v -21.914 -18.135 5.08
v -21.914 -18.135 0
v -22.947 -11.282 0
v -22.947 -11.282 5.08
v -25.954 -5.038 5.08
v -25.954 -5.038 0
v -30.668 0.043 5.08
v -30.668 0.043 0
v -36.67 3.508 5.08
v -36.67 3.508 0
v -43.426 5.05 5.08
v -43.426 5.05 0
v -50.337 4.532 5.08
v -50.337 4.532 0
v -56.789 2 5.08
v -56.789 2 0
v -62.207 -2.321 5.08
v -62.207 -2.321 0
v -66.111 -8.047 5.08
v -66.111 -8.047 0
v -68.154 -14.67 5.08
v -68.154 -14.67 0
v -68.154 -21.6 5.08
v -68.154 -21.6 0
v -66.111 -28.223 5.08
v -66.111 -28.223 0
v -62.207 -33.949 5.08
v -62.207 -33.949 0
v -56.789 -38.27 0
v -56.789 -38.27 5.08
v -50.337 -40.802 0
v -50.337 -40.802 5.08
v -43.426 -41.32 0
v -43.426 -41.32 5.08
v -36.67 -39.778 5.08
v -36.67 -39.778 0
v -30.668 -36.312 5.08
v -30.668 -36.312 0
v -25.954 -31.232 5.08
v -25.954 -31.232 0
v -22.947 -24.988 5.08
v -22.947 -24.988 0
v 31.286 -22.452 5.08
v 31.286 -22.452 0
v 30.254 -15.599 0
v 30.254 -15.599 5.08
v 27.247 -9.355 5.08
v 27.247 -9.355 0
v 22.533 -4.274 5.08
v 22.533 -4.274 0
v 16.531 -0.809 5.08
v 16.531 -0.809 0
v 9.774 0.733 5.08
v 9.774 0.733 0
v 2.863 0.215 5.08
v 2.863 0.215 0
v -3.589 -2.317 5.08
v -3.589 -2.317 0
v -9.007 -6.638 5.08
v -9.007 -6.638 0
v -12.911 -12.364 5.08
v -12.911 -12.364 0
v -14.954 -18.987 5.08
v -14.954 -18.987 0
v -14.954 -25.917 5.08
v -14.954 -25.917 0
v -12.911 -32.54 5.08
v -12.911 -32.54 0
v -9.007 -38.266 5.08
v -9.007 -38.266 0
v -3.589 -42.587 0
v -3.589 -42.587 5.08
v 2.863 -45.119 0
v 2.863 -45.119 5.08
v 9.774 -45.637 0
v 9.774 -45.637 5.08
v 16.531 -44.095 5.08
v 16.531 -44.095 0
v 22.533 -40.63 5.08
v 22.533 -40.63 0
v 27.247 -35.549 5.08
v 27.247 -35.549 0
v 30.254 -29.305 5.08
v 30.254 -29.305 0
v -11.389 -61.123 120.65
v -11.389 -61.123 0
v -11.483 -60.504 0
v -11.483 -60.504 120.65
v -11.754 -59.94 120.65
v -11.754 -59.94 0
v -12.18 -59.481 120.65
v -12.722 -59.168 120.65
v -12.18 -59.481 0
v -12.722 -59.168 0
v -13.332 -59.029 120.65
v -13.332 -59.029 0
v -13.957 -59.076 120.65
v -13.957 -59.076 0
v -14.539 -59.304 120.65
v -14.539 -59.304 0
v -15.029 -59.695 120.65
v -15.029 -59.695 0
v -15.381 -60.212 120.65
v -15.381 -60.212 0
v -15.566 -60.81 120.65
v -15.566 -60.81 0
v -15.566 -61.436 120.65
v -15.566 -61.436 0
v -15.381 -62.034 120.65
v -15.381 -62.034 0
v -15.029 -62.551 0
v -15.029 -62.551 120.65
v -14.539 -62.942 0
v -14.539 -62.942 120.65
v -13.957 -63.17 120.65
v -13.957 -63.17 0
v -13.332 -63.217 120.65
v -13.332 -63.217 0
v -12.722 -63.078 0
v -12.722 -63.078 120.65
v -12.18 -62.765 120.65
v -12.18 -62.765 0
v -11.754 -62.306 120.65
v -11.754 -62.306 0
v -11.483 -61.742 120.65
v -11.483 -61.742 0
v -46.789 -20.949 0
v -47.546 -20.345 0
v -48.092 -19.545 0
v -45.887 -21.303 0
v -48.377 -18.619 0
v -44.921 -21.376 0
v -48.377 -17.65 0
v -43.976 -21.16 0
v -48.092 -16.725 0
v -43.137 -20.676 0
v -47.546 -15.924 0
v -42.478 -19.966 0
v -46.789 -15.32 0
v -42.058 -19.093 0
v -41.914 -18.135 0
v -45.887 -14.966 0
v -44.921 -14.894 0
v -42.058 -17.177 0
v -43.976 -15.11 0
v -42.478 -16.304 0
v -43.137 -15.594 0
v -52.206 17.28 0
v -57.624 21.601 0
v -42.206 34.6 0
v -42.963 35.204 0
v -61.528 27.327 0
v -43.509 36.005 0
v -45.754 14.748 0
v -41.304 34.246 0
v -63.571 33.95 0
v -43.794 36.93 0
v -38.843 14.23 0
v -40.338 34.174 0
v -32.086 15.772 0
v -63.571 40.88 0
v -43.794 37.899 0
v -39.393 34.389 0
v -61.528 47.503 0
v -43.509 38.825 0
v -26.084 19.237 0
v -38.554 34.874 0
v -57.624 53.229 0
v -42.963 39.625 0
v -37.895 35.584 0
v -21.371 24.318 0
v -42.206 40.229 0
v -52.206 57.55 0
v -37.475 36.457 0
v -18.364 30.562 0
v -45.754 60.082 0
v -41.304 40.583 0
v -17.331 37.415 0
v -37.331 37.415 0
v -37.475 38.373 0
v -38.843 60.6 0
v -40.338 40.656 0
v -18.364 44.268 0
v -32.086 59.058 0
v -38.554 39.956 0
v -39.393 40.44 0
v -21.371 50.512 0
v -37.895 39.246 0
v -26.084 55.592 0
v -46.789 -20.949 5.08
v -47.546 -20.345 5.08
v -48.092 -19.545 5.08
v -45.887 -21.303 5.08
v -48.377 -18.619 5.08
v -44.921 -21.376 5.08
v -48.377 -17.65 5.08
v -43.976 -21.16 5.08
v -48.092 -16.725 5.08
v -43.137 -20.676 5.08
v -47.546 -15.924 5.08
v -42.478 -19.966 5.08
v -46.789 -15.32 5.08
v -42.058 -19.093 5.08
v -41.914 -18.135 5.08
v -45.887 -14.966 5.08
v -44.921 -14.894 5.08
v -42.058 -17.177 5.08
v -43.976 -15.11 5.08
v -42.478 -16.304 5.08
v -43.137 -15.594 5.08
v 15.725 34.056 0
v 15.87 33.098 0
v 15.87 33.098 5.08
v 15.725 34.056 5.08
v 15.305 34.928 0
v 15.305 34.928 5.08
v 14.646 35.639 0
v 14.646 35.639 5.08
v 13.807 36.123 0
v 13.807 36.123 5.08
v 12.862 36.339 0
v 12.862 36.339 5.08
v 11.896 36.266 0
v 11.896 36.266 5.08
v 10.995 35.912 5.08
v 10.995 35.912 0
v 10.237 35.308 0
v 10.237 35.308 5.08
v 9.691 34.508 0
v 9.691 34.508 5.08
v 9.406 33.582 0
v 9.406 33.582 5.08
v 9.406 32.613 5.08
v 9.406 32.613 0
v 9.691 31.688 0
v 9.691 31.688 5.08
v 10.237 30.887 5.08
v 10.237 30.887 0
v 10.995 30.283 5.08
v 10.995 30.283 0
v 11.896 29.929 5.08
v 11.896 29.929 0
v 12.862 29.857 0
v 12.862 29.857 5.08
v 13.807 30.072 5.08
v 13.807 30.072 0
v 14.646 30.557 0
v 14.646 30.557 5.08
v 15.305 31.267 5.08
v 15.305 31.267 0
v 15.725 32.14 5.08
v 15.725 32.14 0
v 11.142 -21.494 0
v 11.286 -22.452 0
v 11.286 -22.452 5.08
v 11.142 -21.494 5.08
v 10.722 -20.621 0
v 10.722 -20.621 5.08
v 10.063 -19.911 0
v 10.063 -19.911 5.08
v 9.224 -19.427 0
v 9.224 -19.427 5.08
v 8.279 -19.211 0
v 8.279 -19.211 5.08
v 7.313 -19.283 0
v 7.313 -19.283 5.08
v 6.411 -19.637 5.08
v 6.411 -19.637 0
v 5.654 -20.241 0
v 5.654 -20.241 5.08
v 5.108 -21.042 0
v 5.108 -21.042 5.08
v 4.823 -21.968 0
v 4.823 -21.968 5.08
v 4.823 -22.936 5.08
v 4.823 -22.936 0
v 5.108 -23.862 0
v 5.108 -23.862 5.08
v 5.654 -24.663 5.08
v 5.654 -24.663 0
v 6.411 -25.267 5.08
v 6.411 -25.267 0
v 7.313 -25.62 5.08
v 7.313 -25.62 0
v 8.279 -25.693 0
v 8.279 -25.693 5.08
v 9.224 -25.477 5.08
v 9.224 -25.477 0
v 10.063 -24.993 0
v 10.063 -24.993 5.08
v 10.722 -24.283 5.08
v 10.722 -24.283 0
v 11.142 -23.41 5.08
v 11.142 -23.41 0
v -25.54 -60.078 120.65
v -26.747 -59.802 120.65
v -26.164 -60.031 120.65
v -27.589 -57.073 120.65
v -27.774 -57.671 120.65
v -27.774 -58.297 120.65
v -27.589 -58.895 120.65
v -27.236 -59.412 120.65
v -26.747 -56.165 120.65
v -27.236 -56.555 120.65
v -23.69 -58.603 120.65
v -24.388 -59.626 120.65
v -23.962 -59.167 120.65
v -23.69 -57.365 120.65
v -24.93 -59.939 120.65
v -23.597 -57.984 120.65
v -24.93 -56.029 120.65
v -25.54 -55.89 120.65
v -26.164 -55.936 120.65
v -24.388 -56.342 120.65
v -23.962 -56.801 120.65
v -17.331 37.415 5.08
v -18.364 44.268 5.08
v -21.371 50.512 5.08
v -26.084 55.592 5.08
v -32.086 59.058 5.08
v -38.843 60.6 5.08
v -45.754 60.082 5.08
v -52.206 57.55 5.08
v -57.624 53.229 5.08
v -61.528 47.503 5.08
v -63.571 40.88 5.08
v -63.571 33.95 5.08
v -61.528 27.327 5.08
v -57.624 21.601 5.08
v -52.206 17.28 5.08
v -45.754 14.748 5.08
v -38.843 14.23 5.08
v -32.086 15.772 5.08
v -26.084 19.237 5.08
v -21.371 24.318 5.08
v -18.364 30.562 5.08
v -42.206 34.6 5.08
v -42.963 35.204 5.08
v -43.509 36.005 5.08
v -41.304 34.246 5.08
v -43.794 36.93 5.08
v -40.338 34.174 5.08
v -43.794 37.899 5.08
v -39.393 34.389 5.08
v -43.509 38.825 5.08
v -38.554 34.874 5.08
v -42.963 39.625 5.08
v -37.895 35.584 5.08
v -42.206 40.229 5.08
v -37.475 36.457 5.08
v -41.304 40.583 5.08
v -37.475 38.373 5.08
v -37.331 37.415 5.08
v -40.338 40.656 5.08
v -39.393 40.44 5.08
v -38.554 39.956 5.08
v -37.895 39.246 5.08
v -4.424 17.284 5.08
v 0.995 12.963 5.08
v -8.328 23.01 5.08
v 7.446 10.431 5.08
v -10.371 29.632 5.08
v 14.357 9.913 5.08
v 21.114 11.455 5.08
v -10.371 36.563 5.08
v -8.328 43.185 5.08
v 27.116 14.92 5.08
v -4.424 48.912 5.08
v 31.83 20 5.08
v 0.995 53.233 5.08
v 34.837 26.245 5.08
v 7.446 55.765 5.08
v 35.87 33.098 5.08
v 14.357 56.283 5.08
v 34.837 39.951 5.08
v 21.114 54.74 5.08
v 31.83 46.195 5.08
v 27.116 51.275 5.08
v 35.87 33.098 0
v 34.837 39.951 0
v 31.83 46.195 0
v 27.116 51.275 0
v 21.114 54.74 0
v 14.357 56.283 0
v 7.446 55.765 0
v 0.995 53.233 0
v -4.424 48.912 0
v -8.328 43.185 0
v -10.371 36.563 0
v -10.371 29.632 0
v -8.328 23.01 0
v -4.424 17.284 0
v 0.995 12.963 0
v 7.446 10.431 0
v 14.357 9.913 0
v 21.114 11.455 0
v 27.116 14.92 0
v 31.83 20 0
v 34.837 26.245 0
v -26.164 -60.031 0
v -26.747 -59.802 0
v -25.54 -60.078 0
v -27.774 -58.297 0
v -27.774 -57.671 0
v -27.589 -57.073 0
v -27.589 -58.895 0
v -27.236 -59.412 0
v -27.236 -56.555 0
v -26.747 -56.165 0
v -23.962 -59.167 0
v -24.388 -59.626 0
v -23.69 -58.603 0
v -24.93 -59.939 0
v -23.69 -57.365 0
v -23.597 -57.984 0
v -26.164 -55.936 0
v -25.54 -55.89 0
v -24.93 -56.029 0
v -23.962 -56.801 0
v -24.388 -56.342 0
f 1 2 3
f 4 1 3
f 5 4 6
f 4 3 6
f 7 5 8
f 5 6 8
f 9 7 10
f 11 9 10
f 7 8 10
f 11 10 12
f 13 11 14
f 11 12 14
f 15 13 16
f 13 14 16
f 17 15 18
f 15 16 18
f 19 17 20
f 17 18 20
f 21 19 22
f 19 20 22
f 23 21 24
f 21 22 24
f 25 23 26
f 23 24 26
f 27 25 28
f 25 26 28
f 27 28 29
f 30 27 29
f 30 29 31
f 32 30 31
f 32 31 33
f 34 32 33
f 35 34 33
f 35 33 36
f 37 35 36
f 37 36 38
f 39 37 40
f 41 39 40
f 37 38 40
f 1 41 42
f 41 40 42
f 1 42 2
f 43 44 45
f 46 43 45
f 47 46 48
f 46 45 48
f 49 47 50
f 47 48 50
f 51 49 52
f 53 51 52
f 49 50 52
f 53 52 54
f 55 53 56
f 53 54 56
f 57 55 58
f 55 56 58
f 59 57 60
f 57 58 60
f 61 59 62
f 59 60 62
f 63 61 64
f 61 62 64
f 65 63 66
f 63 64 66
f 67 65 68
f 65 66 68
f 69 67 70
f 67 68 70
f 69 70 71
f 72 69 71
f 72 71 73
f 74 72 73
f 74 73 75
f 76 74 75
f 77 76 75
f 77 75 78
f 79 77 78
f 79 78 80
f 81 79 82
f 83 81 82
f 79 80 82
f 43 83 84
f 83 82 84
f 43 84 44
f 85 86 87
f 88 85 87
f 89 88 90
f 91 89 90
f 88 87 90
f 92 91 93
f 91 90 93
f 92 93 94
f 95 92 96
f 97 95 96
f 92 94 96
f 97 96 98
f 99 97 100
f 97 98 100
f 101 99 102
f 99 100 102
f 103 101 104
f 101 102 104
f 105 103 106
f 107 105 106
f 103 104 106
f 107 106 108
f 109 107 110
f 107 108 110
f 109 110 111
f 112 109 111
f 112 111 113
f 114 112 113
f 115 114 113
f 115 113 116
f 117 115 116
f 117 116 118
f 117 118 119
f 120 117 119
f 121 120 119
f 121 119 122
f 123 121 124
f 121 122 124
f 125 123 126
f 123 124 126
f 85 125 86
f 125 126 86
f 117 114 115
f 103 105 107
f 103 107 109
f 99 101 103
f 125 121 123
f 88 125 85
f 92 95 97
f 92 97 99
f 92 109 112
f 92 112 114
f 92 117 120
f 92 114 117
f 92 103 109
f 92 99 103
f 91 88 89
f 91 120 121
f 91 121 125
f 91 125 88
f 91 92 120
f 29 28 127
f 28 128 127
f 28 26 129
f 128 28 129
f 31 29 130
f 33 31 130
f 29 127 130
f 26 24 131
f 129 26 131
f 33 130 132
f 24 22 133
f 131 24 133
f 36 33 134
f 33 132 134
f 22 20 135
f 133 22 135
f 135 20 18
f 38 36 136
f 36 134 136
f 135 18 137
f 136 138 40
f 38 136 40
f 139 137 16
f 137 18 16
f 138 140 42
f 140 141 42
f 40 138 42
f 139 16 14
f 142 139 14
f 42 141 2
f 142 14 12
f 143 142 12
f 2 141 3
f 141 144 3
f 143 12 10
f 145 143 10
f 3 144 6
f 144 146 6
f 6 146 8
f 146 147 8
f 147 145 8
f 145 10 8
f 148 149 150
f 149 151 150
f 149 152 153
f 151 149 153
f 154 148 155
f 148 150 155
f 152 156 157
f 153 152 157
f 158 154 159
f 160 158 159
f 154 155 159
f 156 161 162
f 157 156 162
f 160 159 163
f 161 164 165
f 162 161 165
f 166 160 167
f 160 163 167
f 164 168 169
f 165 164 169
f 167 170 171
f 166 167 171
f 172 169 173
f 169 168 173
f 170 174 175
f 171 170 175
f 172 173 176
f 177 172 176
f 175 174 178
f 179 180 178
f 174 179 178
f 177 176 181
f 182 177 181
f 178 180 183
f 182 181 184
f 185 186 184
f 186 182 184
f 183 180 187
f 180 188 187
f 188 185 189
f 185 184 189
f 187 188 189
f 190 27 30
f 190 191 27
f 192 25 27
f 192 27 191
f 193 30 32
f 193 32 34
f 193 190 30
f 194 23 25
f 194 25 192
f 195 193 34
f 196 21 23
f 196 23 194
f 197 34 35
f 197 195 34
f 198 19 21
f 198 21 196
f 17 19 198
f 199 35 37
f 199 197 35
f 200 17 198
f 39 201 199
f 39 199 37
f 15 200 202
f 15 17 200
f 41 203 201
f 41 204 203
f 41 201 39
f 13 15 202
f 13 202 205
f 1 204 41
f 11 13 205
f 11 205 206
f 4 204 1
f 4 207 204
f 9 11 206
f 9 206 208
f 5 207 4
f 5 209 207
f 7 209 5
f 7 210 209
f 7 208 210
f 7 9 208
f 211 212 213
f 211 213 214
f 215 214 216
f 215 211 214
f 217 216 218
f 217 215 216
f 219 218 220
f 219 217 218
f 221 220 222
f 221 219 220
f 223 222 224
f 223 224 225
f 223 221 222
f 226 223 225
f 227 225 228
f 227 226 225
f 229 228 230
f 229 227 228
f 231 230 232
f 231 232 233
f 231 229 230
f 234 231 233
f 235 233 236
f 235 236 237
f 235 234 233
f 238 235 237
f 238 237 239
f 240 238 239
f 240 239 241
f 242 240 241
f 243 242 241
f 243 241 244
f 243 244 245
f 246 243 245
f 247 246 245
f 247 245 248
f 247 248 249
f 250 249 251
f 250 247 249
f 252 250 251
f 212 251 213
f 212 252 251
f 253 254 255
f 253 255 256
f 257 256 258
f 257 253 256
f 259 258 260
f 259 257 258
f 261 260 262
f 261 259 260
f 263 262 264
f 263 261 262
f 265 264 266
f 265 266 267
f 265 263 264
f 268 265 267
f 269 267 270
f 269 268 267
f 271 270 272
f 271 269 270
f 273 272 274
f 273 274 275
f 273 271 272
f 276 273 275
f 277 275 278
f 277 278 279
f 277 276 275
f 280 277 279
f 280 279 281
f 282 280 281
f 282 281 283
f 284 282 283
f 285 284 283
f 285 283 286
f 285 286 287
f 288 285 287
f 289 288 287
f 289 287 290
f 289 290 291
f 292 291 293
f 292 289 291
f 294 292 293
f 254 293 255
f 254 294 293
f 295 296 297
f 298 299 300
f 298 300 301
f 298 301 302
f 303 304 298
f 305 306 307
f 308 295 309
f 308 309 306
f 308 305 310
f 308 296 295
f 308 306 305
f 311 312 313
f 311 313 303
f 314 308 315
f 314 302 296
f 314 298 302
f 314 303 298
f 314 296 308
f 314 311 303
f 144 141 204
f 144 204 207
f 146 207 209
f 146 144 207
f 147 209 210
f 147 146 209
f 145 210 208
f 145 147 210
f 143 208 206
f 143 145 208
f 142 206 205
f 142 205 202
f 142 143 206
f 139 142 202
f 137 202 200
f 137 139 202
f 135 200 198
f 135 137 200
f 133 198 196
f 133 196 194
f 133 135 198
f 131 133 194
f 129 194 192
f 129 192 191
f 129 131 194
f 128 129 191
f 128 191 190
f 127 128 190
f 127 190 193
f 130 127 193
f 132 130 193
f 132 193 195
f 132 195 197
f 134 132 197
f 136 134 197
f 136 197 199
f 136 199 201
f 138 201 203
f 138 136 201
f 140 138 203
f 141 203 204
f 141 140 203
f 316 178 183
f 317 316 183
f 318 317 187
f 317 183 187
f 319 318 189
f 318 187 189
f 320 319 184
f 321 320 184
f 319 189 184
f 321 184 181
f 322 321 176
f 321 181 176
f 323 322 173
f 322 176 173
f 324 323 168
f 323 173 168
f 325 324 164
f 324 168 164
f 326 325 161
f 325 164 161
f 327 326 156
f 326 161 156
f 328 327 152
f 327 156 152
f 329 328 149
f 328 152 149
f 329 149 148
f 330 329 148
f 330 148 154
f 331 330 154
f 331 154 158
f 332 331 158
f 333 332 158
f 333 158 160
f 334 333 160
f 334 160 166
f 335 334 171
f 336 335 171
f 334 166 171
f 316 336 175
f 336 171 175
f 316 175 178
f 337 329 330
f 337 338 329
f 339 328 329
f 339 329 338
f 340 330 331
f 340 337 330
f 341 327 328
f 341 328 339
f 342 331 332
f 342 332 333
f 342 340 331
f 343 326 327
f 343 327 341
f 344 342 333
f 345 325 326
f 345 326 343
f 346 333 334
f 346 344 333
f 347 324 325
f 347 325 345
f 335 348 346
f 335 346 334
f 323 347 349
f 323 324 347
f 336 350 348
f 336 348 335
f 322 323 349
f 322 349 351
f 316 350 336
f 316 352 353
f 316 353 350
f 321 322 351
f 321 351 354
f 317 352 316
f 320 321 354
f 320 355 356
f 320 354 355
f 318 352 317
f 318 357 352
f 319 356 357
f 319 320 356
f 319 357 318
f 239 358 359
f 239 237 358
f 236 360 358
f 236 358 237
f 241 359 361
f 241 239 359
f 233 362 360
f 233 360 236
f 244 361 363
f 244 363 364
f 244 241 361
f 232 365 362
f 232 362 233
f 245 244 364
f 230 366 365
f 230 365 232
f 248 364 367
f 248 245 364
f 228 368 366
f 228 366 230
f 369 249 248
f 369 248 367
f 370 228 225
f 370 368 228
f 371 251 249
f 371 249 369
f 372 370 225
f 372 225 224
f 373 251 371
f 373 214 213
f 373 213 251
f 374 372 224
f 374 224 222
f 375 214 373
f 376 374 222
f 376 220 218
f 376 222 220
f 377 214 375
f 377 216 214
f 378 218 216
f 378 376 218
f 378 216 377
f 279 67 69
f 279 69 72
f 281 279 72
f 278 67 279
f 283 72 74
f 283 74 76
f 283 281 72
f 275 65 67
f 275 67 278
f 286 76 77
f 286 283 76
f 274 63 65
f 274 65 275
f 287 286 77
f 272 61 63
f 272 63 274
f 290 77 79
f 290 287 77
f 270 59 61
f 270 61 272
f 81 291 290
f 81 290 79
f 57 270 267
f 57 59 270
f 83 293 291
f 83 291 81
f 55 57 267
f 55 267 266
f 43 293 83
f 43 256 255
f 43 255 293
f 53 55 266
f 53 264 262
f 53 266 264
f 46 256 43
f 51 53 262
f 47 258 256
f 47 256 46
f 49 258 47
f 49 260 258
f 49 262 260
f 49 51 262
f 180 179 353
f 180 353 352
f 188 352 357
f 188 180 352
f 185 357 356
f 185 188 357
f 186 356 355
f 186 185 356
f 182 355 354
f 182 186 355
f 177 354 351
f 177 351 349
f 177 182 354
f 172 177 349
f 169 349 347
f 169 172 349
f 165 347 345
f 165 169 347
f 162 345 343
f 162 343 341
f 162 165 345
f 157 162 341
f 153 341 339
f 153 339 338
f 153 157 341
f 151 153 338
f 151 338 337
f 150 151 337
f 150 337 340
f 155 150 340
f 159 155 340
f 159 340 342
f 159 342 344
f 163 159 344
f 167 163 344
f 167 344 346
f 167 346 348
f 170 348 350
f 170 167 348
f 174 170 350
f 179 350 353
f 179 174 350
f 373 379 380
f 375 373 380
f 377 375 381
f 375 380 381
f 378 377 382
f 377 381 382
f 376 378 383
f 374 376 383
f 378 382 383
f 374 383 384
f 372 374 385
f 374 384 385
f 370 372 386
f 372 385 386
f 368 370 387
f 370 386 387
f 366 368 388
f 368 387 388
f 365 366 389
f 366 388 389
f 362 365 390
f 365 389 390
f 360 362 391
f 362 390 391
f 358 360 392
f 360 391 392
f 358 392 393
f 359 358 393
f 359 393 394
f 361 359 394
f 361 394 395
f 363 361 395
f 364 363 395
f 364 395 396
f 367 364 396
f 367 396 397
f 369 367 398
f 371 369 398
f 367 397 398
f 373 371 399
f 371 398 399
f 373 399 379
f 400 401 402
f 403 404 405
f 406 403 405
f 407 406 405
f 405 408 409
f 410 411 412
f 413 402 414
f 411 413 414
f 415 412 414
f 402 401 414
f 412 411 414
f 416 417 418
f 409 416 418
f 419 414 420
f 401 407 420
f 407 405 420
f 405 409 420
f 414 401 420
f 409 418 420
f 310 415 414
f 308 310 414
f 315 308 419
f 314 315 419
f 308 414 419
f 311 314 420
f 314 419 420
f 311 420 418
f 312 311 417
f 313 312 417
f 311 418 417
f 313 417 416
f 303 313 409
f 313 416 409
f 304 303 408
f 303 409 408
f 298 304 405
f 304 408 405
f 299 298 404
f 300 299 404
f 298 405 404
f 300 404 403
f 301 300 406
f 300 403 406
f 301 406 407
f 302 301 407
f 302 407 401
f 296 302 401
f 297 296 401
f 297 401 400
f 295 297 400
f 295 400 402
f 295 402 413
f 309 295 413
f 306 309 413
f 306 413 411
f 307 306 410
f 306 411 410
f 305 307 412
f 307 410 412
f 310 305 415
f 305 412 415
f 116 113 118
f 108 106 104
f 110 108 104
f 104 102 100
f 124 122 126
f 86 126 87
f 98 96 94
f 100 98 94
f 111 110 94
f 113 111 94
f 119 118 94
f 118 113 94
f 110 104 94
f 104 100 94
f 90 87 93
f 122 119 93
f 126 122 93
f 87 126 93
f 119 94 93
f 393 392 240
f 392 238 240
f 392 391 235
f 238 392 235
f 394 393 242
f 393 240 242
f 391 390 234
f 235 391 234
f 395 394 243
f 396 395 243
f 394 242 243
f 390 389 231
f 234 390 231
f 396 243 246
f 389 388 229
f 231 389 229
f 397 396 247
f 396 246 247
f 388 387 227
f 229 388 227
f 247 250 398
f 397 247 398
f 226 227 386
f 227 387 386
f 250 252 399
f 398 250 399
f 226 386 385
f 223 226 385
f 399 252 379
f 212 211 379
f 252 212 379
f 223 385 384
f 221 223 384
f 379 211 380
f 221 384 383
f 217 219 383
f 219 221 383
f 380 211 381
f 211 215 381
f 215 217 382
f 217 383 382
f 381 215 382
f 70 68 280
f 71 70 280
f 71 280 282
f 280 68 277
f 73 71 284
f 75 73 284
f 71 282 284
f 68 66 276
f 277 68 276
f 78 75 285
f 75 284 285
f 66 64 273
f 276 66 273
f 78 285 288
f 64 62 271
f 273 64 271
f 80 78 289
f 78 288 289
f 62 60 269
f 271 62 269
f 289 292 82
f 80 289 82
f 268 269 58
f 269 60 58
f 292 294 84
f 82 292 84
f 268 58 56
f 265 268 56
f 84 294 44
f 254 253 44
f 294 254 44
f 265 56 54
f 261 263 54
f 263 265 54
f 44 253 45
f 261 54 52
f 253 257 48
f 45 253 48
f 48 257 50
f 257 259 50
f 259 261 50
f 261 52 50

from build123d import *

# Parameters (mm, degrees)
F0_R     = 23.25
F0_R_2   = 3.25
F1_DEPTH = 5.08
F2_R     = 2.1
F3_DEPTH = 120.65


with BuildPart() as f1:
    # F0 (on Top) → F1 (new body)
    with BuildSketch(Plane.XY):
        with Locations((-40.580612, 37.414747)):
            Circle(F0_R)
        with Locations((-40.580612, 37.414747)):
            Circle(F0_R_2, mode=Mode.SUBTRACT)
        with Locations((12.619602, 33.097664)):
            Circle(F0_R)
        with Locations((12.619602, 33.097664)):
            Circle(F0_R_2, mode=Mode.SUBTRACT)
        with Locations((-45.163741, -18.134863)):
            Circle(F0_R)
        with Locations((-45.163741, -18.134863)):
            Circle(F0_R_2, mode=Mode.SUBTRACT)
        with Locations((8.036472, -22.451946)):
            Circle(F0_R)
        with Locations((8.036472, -22.451946)):
            Circle(F0_R_2, mode=Mode.SUBTRACT)
    extrude(amount=F1_DEPTH)


with BuildPart() as f3:
    # F2 (on Top) → F3 (new body)
    with BuildSketch(Plane.XY):
        with Locations((-25.697068, -57.983796)):
            Circle(F2_R)
        with Locations((-13.489387, -61.122917)):
            Circle(F2_R)
    extrude(amount=F3_DEPTH)


solid = Compound([f1.part, f3.part])
